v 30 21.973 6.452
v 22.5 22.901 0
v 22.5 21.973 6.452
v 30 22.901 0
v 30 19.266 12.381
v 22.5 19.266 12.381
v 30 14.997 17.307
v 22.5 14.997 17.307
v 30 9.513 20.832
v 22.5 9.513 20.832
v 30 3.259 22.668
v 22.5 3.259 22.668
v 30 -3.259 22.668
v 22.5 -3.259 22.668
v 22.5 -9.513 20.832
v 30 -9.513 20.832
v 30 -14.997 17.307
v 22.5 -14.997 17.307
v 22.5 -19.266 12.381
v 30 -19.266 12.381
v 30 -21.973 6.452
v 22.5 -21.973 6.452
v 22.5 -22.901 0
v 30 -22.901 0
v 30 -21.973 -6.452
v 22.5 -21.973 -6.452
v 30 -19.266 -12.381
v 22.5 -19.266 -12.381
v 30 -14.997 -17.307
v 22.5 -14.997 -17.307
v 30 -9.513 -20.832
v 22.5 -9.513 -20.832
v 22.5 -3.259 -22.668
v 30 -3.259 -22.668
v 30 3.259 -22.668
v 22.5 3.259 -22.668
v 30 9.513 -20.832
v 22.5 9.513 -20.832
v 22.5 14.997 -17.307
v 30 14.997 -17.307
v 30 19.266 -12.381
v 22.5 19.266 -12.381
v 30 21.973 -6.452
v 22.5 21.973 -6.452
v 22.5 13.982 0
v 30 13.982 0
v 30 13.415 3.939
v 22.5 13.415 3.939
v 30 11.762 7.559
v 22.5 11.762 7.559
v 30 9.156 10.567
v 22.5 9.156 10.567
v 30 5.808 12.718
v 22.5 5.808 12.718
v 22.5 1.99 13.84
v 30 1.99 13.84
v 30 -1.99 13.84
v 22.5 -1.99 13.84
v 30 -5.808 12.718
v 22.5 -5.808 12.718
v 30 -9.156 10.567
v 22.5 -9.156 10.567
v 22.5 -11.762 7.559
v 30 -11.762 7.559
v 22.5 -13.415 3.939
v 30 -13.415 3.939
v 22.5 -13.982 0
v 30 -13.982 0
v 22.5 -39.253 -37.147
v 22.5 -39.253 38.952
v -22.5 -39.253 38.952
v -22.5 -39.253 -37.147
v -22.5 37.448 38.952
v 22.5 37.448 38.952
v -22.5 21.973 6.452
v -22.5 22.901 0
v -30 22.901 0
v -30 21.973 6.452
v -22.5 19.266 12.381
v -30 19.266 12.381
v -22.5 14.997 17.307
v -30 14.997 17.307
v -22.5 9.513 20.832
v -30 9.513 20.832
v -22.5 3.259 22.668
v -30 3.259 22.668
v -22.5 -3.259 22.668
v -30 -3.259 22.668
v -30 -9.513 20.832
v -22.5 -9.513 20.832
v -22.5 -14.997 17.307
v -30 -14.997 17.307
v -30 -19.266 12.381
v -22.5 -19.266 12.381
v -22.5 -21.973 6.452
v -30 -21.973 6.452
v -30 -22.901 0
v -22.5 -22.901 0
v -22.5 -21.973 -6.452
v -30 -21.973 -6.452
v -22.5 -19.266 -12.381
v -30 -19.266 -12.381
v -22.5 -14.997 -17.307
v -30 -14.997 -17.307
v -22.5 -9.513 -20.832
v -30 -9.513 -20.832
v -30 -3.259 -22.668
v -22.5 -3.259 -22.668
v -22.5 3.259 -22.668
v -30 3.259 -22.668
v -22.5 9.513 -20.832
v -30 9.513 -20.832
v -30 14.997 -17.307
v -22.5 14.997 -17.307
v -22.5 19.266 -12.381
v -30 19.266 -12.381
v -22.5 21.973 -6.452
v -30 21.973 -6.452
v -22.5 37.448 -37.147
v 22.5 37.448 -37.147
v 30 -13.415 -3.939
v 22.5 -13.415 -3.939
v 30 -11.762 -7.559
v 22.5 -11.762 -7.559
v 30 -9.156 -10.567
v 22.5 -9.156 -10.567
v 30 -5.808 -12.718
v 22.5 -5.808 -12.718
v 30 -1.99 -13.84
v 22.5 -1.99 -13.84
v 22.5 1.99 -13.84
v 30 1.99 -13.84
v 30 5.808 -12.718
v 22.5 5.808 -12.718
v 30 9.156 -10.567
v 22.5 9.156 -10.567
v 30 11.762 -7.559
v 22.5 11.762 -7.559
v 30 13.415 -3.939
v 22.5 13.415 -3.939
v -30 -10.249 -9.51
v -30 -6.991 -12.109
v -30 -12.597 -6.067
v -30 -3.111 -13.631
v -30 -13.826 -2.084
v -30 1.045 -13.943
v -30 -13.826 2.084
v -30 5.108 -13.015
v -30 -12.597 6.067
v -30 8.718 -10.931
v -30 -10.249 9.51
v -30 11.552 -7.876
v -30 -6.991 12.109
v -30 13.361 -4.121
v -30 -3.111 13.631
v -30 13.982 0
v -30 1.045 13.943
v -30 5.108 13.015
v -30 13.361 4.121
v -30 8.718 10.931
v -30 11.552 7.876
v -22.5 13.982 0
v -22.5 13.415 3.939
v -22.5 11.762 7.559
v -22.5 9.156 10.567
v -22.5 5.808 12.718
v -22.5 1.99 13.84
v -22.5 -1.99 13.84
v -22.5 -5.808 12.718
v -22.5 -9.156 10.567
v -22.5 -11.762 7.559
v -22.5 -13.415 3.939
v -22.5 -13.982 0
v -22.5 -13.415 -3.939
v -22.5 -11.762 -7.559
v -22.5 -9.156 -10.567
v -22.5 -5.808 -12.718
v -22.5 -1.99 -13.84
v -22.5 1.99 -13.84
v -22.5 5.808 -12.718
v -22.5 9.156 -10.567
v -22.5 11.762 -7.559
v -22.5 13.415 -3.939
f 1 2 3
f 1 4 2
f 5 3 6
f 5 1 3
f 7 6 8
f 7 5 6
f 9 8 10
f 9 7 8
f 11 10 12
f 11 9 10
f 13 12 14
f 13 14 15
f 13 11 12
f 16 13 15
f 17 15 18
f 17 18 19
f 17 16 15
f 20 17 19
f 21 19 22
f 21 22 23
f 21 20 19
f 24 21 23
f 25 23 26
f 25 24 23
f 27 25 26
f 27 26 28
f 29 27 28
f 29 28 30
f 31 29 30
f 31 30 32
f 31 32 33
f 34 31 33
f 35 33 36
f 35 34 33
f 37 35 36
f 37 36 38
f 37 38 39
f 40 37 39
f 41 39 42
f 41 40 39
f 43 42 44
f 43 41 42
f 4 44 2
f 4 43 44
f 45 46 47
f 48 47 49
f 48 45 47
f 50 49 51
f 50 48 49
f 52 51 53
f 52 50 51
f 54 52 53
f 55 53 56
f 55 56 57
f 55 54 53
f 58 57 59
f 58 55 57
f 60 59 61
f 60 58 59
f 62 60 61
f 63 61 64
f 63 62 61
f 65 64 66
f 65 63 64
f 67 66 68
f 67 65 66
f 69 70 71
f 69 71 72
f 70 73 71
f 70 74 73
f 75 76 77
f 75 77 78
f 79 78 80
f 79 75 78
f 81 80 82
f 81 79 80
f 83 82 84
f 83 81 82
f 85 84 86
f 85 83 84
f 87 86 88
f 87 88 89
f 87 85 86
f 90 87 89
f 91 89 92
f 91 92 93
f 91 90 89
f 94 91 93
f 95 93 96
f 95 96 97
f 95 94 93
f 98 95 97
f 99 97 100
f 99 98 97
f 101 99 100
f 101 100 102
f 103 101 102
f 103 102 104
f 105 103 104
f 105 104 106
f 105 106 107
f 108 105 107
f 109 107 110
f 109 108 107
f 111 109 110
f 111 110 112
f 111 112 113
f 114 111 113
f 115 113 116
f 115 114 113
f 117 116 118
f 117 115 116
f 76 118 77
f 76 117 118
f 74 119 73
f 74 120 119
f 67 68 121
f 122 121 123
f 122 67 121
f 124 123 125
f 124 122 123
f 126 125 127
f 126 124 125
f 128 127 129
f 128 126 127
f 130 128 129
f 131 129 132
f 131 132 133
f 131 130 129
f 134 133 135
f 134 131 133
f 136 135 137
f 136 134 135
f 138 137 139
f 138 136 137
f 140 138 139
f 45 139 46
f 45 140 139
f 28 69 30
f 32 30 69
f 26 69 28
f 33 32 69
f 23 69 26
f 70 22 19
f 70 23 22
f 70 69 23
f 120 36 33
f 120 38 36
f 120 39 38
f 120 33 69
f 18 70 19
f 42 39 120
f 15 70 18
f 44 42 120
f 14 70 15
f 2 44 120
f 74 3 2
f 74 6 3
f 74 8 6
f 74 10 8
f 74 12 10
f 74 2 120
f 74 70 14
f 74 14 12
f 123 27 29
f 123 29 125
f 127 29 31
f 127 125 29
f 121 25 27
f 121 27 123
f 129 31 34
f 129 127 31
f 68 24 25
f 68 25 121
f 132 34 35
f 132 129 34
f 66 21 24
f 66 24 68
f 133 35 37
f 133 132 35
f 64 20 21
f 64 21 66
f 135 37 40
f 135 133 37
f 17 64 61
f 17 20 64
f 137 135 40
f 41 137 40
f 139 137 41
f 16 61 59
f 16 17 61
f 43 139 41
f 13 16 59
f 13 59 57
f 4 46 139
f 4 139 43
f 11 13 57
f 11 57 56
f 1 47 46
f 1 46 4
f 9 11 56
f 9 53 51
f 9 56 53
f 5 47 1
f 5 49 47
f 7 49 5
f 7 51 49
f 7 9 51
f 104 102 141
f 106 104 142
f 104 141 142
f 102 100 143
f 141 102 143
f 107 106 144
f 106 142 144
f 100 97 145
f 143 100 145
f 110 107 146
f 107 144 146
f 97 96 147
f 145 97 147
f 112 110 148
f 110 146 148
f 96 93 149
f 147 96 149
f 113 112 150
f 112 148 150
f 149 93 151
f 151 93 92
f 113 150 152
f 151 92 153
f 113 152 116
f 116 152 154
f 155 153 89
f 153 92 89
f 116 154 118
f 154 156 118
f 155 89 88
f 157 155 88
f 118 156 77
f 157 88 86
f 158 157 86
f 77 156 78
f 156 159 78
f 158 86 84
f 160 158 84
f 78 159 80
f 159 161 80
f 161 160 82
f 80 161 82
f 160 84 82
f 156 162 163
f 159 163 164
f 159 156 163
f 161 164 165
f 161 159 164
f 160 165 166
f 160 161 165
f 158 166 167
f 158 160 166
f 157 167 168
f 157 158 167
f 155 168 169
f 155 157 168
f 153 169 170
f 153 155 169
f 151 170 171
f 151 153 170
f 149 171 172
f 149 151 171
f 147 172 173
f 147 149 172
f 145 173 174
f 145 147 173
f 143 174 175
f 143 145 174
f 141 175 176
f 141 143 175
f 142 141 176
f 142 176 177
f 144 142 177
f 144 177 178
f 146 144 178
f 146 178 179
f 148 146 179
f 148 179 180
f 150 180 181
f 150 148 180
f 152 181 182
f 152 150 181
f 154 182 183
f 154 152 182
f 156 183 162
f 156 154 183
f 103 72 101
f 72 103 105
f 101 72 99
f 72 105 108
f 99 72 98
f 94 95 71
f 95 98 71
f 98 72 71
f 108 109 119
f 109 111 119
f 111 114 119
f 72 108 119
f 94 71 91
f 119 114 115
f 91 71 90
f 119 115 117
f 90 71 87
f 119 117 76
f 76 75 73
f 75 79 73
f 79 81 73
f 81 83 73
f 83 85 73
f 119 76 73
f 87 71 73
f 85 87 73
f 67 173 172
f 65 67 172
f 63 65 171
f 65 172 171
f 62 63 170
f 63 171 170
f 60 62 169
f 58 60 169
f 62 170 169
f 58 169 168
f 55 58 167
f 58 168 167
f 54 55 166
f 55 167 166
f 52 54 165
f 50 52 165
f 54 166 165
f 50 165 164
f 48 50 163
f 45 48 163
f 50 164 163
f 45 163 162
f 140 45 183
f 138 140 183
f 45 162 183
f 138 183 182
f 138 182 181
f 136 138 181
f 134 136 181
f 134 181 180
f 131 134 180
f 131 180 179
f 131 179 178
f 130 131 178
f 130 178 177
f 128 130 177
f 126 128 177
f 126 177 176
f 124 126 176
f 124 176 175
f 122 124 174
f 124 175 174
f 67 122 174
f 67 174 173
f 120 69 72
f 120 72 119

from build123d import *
from build123d import SkipClean  # not in build123d's __all__

# Parameters (mm, degrees)
F0_R     = 22.9010259121
F0_R_2   = 13.9818591187
F1_DEPTH = 30
F3_DEPTH = 22.5
F4_R     = 13.9818591187
F5_DEPTH = 52.501


with BuildPart() as f1:
    # F0 (on Right) → F1 (new body, symmetric)
    with BuildSketch(Plane.YZ):
        Circle(F0_R)
        Circle(F0_R_2, mode=Mode.SUBTRACT)
    extrude(amount=F1_DEPTH, both=True)

    # F2 (on Right) → F3 (join, symmetric)
    with BuildSketch(Plane.YZ):
        Polygon((37.4482907355, 38.9522351325), (0, 38.9522351325), (-39.253026247, 38.9522351325), (-39.253026247, -37.1474996209), (37.4482907355, -37.1474996209), align=None)
    extrude(amount=F3_DEPTH, both=True)

    # F4 (on face) → F5 (cut, through all)
    with BuildSketch(Plane(origin=(-22.5, 0, 0), x_dir=(0, -1, 0), z_dir=(-1, 0, 0))):
        Circle(F4_R)
    with SkipClean():  # cleaning this boolean's faces spoils the solid; the shape is the same uncleaned
        extrude(amount=-F5_DEPTH, mode=Mode.SUBTRACT)


solid = f1.part
